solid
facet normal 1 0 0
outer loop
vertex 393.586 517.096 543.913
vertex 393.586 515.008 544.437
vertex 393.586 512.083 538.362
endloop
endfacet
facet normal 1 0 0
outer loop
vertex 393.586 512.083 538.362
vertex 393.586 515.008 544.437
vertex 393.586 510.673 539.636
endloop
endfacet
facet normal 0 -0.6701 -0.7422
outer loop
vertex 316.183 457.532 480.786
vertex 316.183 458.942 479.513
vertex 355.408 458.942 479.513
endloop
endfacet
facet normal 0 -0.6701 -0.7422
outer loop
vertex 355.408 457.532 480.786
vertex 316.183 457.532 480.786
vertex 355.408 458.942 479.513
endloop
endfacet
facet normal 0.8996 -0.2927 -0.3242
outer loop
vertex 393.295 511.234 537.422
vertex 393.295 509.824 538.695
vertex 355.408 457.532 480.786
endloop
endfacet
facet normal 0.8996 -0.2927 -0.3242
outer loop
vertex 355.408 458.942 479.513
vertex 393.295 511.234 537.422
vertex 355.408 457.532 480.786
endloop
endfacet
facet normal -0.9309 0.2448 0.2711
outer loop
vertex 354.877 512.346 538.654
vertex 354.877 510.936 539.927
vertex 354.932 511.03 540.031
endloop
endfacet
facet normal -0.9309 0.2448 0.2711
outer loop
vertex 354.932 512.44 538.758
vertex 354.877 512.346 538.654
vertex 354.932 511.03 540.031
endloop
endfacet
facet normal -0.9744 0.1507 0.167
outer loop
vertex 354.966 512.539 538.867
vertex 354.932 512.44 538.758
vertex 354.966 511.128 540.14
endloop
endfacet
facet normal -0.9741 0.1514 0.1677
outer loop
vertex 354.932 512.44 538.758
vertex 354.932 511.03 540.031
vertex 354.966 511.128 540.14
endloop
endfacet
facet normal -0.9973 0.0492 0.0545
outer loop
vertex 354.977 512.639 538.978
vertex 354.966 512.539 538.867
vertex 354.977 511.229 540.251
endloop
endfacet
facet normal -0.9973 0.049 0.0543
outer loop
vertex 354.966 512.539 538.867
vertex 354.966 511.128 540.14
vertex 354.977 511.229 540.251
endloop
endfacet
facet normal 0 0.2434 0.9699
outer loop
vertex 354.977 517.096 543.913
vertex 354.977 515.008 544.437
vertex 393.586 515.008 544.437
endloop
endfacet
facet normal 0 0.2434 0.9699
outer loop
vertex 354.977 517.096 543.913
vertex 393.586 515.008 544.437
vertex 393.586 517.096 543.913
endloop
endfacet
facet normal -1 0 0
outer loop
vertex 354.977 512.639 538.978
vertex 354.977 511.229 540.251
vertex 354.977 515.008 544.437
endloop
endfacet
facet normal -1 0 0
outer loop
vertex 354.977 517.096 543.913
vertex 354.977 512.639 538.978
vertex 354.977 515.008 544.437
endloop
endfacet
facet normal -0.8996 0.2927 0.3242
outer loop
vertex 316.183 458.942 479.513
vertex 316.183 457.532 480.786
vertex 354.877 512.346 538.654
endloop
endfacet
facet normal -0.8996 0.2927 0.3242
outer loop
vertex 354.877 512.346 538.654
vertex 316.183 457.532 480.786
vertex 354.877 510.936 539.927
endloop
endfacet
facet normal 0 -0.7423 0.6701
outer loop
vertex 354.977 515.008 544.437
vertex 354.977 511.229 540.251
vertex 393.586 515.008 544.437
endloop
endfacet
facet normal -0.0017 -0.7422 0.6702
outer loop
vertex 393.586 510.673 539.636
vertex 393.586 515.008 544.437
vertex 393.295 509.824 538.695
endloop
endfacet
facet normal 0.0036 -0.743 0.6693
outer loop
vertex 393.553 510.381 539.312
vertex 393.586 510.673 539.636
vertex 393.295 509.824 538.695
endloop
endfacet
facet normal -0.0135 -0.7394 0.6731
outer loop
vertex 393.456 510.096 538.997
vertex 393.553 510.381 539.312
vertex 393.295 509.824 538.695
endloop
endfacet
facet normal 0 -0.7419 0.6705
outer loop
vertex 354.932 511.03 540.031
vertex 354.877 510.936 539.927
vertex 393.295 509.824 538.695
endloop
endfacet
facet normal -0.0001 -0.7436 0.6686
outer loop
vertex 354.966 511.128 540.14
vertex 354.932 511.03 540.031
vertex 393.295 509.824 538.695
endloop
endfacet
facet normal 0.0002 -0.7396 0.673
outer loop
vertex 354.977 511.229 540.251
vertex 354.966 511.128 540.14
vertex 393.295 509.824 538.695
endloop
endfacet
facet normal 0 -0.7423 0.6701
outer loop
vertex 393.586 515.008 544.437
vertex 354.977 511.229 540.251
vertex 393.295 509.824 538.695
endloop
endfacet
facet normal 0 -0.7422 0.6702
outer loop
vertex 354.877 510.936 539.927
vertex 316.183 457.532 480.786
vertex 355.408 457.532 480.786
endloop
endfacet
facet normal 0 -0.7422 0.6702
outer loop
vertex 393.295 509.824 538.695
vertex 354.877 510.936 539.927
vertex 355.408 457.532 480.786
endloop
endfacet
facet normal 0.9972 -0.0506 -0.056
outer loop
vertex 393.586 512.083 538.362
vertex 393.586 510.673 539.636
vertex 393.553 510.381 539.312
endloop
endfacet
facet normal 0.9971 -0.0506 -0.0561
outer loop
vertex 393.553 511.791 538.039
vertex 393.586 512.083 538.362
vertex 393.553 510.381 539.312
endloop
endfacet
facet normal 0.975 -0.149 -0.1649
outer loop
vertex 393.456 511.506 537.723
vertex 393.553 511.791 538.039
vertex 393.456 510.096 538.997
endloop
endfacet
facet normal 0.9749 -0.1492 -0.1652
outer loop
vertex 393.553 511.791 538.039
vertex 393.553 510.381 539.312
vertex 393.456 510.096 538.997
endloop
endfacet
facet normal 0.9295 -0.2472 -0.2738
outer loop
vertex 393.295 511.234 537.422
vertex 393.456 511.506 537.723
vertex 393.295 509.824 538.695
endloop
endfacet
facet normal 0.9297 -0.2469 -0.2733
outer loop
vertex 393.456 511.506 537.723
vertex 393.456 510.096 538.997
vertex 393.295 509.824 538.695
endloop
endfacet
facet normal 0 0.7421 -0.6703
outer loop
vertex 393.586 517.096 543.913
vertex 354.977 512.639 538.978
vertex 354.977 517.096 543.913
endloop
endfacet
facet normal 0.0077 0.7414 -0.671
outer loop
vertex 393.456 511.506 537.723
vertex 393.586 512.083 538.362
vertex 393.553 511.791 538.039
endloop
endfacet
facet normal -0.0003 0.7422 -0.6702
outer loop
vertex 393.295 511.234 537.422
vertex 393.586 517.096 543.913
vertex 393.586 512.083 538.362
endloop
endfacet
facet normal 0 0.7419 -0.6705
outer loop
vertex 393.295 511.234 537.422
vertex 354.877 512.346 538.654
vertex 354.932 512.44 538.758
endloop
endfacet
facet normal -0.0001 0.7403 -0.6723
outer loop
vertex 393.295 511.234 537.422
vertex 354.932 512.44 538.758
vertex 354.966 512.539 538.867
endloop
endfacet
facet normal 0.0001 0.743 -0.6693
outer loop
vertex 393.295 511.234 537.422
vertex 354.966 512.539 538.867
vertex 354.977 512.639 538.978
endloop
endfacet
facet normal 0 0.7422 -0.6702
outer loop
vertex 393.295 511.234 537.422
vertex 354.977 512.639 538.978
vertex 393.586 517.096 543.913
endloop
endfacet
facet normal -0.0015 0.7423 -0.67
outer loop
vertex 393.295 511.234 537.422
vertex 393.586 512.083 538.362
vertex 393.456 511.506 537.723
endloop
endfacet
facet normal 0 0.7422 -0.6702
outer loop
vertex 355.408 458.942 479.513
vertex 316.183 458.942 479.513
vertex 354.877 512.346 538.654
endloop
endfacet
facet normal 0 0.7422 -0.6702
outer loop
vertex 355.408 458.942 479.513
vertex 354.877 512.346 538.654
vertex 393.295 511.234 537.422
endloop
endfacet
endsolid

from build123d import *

# Parameters (mm, degrees)
BASE_FLANGE1_DEPTH     = 1.9
CUT_EXTRUDE4_DEPTH     = 51
CUT_EXTRUDE5_DEPTH     = 71
CUT_EXTRUDE6_START     = 657.08317619
CUT_EXTRUDE6_OUTLINE_W = 45
CUT_EXTRUDE6_OUTLINE_H = 5
CUT_EXTRUDE6_DEPTH     = 6.384307163


# Read off the part's stored shape, not the designer's step: Cut-Extrude6
# Sheet-metal steps are written as plain solids
with BuildPart() as part:
    # Sketch2 → Base-Flange1 (new body)
    with BuildSketch(Plane(origin=(0, 12.879518456, -11.630211804), x_dir=(1, 0, 0), z_dir=(0, 0.7421858097500026, -0.6701941687345042))):
        with BuildLine():
            Line((393.586333182, -753.894678625), (393.586333182, -742.759749552))
            ThreePointArc((393.586333182, -742.759749552), (393.512573412, -742.109852512), (393.295046173, -741.493014958))
            Line((393.295046173, -741.493014958), (348.107032655, -648.432828145))
            Line((348.107032655, -648.432828145), (308.882727398, -648.432828145))
            Line((308.882727398, -648.432828145), (354.876732599, -743.152874081))
            ThreePointArc((354.876732599, -743.152874081), (354.951741991, -743.365576685), (354.977176395, -743.589679113))
            Line((354.977176395, -743.589679113), (354.977176395, -753.894678625))
            Line((354.977176395, -753.894678625), (393.586333182, -753.894678625))
        make_face()
    extrude(amount=BASE_FLANGE1_DEPTH)

    # Sketch7 → Cut-Extrude4 (cut)
    with BuildSketch(Plane(origin=(393.586333182, 0, 0), x_dir=(0, 0, -1), z_dir=(1, 0, 0))):
        Polygon((-546.842488726, 505.418101773), (-542.81093091, 521.489711401), (-552.083782305, 523.815803023), align=None)
    extrude(amount=-CUT_EXTRUDE4_DEPTH, mode=Mode.SUBTRACT)

    # Sketch8 → Cut-Extrude5 (cut)
    with BuildSketch(Plane(origin=(367.203150583, 992.710115794, 1099.346123122), x_dir=(0, 0.9994421284849351, 0.03339808092544755), z_dir=(-1, 0, 0))):
        Polygon((-558.189174553, 593.766016484), (-559.014569405, 618.466070053), (-566.956297266, 616.781727113), (-568.023912054, 608.400656093), align=None)
    extrude(amount=CUT_EXTRUDE5_DEPTH, mode=Mode.SUBTRACT)

    # Cut-Extrude6 outline → Cut-Extrude6 (cut)
    with BuildSketch(Plane(origin=(0, 0, 0), x_dir=(1, 0, 0), z_dir=(0, 0.6701941687345039, 0.7421858097500029)).offset(CUT_EXTRUDE6_START)):
        with Locations((334.5, 18.5)):
            Rectangle(CUT_EXTRUDE6_OUTLINE_W, CUT_EXTRUDE6_OUTLINE_H)
    extrude(amount=CUT_EXTRUDE6_DEPTH, mode=Mode.SUBTRACT)


solid = part.part
